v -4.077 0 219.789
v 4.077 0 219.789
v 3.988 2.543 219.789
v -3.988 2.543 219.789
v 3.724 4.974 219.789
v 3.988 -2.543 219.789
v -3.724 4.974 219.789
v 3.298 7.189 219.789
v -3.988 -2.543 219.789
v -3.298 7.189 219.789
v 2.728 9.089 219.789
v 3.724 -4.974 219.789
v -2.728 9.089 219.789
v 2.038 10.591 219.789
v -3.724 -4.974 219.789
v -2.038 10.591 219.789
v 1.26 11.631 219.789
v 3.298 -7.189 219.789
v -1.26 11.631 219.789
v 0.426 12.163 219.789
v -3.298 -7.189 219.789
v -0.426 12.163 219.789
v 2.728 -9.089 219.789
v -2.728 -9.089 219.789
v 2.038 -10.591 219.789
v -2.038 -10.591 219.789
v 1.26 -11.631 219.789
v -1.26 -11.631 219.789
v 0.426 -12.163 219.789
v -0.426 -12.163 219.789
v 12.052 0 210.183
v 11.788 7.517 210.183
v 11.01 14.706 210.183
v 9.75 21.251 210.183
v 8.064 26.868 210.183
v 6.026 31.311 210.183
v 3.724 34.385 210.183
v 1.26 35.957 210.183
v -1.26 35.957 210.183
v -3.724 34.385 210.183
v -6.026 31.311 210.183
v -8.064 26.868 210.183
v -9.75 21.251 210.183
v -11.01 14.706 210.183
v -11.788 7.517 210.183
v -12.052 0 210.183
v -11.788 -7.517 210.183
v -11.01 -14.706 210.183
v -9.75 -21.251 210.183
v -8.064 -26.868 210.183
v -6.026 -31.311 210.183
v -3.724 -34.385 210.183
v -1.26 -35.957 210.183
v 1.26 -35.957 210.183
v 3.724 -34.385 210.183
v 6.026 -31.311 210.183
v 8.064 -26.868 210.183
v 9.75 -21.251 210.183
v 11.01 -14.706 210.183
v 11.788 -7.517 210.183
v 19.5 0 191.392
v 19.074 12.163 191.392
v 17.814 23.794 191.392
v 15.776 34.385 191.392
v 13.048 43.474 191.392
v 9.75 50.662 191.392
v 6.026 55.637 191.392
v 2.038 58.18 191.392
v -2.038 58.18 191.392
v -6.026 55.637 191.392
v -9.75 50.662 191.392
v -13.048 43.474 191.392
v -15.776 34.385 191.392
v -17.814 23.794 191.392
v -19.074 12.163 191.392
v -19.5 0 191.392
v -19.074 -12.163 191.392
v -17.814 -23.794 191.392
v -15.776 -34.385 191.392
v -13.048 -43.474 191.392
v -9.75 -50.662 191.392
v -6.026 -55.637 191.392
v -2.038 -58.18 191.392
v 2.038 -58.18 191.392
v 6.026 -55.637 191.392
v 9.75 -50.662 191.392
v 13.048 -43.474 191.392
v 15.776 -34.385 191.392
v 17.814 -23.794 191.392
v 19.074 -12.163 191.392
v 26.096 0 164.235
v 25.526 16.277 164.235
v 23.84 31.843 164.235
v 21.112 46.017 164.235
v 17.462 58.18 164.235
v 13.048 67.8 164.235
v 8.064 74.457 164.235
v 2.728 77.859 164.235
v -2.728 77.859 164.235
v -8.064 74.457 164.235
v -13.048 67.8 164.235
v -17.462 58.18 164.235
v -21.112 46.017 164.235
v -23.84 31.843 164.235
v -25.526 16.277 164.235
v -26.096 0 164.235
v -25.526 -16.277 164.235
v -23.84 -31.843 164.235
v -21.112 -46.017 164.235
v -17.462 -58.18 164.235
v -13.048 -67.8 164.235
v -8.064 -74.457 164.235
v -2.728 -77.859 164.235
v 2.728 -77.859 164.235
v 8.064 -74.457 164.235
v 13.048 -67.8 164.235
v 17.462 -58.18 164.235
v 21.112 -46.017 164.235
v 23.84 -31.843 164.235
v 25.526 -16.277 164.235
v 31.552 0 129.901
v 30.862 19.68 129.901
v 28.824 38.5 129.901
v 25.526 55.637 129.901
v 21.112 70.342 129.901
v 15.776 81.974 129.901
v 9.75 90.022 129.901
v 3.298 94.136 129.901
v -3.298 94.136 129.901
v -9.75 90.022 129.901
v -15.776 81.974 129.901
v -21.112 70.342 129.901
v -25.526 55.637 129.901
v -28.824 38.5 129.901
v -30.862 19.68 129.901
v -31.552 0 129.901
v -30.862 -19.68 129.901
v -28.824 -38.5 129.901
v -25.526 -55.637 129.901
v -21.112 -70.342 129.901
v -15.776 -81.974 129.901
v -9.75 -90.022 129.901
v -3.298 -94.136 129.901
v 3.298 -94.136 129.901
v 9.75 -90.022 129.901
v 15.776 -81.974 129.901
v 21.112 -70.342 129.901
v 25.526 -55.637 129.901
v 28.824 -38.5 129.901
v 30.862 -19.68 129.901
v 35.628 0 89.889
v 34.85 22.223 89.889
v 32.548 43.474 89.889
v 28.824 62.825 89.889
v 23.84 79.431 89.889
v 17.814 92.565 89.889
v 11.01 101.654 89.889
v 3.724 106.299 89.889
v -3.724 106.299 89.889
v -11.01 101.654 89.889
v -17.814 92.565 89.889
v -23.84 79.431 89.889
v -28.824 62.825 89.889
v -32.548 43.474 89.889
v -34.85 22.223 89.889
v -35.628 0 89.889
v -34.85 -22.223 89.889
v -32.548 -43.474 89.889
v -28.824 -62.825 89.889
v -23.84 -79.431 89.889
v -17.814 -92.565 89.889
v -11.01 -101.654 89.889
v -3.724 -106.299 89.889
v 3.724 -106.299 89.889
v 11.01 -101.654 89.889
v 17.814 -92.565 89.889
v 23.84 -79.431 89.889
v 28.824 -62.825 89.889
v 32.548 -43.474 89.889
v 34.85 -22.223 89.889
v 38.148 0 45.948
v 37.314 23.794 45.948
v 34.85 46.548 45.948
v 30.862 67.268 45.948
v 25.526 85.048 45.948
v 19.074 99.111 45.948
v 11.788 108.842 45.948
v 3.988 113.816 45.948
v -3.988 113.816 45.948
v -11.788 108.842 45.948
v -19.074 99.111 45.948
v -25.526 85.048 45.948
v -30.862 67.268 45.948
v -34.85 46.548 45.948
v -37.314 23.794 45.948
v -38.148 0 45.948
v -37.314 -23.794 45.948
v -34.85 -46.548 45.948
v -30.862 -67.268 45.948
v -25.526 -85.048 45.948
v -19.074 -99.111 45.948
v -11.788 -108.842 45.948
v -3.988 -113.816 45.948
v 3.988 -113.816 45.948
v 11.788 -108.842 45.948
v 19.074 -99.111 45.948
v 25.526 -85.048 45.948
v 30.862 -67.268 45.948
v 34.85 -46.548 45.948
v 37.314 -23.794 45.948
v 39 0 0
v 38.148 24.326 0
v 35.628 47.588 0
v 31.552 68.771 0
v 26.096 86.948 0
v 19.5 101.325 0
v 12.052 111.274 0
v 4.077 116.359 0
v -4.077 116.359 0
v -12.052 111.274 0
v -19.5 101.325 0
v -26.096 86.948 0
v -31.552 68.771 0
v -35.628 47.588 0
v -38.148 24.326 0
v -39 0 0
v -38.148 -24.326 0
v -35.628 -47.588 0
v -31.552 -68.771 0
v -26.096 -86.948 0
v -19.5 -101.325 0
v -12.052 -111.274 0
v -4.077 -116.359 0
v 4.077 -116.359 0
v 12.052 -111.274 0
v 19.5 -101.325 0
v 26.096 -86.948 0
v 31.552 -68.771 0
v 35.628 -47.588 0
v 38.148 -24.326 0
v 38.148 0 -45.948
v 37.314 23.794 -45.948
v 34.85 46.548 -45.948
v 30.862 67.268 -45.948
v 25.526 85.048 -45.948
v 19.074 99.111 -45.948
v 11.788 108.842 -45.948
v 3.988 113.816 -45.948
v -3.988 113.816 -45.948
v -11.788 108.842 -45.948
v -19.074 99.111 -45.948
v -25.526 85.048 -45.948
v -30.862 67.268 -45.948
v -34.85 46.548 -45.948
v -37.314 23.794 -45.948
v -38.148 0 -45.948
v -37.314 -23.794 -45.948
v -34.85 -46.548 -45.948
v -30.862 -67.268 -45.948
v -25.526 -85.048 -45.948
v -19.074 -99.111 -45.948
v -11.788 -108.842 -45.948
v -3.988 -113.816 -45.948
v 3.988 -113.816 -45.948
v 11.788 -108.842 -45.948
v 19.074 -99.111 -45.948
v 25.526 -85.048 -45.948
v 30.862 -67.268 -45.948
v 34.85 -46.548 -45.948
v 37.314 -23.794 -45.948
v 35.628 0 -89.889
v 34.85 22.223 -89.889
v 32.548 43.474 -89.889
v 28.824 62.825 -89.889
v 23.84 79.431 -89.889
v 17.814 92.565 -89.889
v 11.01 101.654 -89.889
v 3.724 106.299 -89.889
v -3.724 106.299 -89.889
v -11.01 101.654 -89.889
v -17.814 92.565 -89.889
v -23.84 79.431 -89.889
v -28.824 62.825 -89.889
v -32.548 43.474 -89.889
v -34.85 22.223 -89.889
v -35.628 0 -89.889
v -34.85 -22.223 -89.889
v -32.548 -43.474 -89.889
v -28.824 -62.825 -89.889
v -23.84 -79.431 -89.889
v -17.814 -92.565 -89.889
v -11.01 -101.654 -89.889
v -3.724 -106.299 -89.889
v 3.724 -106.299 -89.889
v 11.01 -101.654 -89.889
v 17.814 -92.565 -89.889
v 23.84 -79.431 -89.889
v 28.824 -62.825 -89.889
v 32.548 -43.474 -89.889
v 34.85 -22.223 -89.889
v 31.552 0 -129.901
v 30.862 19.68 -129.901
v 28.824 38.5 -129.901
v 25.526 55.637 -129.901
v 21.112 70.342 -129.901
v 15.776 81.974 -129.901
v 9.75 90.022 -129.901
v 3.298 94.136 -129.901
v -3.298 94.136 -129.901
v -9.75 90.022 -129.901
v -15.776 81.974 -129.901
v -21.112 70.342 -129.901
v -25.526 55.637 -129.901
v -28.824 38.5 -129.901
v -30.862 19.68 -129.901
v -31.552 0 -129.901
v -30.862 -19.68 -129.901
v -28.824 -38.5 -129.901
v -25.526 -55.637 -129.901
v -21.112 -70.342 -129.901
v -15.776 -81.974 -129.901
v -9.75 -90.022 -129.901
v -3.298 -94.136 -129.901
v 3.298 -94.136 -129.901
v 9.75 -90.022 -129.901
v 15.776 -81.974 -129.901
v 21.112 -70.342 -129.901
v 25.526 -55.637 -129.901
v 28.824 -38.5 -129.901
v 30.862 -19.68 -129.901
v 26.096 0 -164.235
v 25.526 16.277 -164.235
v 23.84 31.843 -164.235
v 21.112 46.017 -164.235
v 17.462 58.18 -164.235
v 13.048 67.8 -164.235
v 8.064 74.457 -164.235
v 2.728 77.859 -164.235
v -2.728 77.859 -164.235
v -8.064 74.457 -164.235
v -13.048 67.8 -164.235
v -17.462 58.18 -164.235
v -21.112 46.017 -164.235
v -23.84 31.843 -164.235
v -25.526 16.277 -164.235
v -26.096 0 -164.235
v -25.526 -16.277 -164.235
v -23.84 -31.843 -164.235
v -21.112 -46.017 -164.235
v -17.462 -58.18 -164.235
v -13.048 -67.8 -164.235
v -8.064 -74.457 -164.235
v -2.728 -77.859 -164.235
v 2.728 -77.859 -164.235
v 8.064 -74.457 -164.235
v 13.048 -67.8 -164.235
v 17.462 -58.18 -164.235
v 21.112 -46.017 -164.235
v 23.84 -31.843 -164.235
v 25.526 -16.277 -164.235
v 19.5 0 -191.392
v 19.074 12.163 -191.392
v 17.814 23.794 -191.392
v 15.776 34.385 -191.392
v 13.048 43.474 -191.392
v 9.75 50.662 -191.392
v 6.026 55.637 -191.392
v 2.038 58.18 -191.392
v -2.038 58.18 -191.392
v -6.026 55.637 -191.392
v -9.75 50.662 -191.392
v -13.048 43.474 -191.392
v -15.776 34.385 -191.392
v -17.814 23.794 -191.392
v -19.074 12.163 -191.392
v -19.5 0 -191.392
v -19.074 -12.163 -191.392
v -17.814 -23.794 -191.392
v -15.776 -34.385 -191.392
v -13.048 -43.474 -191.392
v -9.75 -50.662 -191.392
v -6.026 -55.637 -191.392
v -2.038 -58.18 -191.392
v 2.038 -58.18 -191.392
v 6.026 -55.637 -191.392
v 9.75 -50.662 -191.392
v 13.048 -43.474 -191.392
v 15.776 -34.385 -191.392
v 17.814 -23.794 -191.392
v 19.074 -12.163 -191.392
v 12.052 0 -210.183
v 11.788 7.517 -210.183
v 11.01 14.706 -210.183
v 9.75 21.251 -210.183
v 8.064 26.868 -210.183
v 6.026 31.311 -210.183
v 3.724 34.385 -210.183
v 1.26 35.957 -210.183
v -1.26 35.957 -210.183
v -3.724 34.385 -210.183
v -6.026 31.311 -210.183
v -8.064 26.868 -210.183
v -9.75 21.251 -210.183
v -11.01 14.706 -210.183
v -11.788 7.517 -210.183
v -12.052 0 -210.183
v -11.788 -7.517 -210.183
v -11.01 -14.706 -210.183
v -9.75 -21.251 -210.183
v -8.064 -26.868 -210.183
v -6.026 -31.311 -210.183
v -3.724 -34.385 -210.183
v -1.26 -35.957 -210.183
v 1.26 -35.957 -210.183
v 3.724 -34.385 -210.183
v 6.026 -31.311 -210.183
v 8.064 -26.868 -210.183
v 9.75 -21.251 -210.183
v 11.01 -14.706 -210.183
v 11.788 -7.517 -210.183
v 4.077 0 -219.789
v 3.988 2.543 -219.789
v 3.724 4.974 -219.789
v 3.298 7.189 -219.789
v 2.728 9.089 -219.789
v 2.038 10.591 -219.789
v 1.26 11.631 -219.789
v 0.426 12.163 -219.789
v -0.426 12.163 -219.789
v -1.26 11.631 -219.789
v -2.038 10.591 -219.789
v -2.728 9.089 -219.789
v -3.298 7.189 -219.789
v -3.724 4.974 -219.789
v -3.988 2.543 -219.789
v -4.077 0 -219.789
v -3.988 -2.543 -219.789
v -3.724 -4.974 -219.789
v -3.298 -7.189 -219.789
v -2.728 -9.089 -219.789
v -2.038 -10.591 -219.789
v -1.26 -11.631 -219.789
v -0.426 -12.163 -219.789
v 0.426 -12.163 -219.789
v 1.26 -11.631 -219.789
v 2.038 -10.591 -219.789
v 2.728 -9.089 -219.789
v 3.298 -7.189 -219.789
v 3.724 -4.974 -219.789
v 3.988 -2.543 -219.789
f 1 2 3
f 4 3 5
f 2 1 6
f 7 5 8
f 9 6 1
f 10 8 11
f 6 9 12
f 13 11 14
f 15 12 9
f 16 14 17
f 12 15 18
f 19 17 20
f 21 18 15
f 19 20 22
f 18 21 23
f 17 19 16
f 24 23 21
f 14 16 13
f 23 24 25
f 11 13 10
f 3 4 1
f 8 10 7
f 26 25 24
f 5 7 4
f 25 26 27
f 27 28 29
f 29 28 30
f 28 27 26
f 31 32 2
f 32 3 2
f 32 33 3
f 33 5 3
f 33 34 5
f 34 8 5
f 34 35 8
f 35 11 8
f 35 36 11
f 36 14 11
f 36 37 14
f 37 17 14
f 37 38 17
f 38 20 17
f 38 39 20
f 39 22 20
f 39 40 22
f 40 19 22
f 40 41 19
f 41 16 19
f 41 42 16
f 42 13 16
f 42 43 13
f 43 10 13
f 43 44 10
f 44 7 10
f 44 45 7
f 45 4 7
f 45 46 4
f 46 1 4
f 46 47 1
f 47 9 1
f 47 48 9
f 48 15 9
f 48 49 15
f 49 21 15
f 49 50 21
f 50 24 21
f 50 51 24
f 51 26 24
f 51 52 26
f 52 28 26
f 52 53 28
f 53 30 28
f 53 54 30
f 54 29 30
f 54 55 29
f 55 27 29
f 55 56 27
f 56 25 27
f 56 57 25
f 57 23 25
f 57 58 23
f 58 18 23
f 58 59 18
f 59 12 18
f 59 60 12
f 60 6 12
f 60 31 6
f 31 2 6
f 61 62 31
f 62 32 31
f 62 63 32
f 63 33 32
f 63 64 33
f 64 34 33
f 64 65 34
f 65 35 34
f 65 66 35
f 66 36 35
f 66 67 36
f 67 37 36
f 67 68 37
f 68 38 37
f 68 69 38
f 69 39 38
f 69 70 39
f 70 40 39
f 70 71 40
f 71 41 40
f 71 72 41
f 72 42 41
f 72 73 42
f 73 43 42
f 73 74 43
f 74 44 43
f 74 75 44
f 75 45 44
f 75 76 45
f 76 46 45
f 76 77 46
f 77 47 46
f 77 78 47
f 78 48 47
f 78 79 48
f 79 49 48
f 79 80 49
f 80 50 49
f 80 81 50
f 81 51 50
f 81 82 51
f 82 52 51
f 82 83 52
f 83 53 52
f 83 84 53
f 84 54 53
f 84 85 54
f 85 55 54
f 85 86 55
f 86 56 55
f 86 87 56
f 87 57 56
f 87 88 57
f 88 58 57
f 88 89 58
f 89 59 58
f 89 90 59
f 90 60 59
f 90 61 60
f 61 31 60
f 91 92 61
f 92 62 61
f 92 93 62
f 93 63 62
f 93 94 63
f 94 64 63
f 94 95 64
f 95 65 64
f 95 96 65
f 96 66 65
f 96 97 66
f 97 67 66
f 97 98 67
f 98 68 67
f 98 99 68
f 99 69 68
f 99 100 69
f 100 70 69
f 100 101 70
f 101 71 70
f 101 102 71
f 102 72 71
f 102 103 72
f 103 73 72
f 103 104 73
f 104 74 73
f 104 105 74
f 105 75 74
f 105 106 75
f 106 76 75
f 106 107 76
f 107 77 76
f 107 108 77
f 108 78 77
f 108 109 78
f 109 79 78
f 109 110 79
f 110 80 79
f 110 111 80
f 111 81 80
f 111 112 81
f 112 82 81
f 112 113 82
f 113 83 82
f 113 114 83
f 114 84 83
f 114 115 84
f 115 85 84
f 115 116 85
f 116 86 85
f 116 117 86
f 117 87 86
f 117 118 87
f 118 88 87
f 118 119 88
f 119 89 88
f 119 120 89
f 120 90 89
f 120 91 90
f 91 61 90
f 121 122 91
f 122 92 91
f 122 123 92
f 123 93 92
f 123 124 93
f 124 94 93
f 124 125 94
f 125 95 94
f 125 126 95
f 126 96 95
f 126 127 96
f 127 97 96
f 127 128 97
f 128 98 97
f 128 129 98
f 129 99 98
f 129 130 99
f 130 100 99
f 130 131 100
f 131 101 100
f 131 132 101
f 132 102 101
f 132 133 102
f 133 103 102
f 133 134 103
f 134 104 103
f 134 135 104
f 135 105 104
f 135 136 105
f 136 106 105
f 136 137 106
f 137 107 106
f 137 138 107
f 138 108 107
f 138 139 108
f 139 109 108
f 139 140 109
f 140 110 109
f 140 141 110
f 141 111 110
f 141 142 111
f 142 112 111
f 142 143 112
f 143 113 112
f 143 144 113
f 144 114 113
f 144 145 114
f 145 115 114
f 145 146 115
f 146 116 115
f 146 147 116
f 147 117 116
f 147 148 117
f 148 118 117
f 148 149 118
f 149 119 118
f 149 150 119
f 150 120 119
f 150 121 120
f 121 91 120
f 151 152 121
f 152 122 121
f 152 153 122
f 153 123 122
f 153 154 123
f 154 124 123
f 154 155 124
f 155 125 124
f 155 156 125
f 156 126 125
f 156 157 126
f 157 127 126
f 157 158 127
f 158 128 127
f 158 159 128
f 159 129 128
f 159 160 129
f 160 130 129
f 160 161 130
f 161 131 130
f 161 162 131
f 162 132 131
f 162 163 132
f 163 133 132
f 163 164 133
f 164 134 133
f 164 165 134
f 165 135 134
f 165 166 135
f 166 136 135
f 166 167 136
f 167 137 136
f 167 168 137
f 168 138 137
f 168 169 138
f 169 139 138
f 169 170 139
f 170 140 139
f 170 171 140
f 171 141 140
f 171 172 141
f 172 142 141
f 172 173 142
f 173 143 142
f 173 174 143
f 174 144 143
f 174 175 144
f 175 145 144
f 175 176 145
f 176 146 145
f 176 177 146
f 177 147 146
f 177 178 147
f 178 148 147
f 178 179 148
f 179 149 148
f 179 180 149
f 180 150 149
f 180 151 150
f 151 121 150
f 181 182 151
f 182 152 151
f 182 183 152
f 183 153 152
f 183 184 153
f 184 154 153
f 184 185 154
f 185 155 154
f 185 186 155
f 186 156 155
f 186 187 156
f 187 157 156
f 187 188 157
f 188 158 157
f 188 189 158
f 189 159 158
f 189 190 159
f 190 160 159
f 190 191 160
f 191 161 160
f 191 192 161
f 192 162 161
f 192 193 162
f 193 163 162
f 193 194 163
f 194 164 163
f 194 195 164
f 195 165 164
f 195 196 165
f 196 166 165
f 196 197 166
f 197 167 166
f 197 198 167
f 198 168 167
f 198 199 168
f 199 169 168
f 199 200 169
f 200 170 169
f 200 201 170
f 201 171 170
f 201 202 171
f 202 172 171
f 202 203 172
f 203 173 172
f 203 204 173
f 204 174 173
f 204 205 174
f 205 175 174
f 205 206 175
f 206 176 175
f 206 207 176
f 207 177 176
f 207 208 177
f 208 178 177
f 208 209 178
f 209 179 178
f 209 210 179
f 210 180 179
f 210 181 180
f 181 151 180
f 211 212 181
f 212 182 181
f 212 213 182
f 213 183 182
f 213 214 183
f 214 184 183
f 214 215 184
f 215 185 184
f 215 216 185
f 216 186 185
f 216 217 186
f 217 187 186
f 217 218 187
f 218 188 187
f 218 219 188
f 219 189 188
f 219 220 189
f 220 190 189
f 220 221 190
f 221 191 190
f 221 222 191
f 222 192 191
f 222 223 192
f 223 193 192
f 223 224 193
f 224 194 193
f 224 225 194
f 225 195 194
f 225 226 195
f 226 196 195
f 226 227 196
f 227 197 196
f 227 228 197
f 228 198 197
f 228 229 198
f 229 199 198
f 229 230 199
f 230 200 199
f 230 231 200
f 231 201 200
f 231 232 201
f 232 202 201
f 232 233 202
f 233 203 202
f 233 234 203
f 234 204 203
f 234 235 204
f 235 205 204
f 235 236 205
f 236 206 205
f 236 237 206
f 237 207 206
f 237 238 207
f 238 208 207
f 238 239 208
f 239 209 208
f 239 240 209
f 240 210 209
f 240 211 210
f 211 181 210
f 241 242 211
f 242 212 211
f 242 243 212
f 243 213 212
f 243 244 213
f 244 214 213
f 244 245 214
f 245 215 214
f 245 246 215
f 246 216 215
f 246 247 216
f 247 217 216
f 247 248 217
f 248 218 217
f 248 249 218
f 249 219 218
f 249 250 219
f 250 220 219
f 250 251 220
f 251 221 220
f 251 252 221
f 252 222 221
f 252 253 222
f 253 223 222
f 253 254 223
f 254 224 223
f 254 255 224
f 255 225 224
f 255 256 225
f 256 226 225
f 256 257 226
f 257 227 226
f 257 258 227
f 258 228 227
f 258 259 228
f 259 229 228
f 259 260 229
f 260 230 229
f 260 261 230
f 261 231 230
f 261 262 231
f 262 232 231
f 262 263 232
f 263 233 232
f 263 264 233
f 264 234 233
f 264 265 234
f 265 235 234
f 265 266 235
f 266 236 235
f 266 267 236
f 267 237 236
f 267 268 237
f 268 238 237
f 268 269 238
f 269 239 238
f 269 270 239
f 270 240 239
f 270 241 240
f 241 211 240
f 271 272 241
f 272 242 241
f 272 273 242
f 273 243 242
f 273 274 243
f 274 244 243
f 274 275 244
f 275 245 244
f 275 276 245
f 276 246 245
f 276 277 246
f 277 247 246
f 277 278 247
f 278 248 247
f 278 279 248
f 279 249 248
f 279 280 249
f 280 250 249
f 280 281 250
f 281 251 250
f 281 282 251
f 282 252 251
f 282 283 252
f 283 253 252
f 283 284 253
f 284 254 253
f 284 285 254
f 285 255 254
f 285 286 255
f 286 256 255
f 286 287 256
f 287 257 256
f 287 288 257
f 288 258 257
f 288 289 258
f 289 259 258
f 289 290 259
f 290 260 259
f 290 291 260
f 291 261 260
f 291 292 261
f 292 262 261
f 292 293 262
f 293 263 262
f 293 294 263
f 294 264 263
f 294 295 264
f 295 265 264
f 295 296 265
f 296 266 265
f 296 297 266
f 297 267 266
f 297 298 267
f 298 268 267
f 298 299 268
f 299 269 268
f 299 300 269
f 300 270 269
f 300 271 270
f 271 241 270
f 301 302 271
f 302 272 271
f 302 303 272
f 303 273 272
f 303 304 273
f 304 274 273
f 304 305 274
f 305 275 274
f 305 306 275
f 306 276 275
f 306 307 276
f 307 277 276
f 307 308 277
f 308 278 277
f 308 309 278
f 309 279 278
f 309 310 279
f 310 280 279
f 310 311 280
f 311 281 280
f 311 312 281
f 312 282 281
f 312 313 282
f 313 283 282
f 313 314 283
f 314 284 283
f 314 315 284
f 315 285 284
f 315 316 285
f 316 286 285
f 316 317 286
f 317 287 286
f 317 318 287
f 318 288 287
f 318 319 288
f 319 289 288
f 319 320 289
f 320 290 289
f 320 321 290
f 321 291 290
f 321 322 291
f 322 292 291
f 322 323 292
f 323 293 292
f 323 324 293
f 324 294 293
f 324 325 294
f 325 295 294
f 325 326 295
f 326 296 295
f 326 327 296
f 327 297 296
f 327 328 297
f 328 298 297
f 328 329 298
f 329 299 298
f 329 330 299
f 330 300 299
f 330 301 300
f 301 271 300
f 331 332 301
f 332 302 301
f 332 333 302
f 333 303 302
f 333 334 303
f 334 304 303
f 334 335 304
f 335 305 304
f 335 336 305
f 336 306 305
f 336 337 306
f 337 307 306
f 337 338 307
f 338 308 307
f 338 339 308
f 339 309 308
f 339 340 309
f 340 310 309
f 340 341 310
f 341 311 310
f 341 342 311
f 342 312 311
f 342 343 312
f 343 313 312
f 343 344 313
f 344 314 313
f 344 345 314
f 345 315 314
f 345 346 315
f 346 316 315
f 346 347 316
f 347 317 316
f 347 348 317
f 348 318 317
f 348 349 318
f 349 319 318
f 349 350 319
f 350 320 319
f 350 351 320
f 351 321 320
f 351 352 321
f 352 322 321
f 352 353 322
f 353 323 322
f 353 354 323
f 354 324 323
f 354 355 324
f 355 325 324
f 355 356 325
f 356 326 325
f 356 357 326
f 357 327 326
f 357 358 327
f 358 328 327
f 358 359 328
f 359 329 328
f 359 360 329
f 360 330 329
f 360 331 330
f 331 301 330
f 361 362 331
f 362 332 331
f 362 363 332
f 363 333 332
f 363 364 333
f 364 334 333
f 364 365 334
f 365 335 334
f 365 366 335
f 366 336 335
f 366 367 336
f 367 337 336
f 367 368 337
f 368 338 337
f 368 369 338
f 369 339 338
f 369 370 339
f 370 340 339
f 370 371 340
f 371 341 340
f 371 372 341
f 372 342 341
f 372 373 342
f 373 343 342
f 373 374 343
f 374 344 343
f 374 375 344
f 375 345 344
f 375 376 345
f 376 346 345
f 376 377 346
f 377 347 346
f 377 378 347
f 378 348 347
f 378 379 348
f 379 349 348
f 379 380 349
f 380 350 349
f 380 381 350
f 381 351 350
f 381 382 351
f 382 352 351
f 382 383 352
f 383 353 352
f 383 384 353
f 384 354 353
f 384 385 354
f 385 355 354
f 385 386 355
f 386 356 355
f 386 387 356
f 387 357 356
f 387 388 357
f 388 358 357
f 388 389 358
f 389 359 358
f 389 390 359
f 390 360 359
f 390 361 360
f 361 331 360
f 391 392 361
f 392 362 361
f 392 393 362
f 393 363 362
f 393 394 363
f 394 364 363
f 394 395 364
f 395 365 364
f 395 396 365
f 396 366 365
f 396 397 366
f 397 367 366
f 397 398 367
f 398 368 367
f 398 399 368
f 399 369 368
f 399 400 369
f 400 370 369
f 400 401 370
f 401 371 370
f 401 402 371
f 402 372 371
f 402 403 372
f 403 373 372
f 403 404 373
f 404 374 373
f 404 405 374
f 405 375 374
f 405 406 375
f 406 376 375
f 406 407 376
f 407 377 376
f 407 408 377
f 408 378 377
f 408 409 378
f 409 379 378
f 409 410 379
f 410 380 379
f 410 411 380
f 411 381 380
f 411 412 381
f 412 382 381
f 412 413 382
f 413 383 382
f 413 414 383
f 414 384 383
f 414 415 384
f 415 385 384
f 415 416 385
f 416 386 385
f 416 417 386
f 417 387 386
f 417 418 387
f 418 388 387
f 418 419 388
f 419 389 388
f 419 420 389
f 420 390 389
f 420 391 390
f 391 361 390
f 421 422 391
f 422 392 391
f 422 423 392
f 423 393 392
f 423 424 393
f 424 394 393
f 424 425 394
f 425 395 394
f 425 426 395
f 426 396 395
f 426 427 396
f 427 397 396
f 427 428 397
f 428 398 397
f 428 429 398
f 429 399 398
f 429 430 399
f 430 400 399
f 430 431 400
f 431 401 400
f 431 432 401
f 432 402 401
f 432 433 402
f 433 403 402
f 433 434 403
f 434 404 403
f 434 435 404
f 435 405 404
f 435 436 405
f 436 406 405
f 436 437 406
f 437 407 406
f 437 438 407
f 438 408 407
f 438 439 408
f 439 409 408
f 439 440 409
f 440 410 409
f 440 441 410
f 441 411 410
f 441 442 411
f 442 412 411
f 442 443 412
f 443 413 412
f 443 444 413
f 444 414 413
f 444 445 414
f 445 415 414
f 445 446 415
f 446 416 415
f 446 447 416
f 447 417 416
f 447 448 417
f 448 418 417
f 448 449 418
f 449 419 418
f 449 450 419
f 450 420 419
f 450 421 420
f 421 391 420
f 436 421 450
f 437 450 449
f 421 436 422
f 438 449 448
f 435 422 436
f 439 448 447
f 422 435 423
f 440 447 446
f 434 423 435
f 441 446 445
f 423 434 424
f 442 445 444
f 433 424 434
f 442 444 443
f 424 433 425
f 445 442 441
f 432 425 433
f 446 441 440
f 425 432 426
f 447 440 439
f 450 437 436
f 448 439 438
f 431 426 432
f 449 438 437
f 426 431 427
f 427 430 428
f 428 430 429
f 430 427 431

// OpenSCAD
// Generated by SolidPython 1.0.1 on 2020-07-29 00:46:45


scale(v = [3, 9, 17]) {
	sphere(r = 13);
}
/***********************************************
*********      SolidPython code:      **********
************************************************
 
# import packages: SolidPython
from solid import *
from solid.utils import *
from itertools import chain, combinations, permutations


class Resize:

    def __init__(self, scad_file):
        self.scad_file = scad_file
        #self.scad_file = import_scad(scad_file)
        # cone/cylinder param:
        self.r1 = 0
        self.r2 = 0
        self.h = 0
        # rectangular prism param:
        self.w = 0
        self.l = 0
        # ellipse param:
        self.r = 0

    # import OpenScad code (file name corresponds to shape)


    # classify shape + parameters
    def assign(self, param1, param2, param3):
        if self.scad_file == 'cone.scad':
            self.r1 = param1
            self.r2 = param2
            self.h = param3
        elif self.scad_file == 'cylinder.scad':
            self.r1 = param1
            self.r2 = param2
            self.h = param3
        elif self.scad_file == 'rectangularPrism.scad':
            self.h = param1
            self.l = param2
            self.w = param3
        else:
            self.r = param1
            self.h = param2

    # resize parameters
    def iterate(self):
        x = range(3, 20, 2)
        i = 1
        if self.scad_file == 'cone.scad':
            tempList = list(permutations(x, 2))
            for temp in tempList:
                param1 = temp[0]
                param2 = temp[1]
                filepath = 'produced_scad_files/' + 'cone' + str(param1) + '_' + str(param2) + '_' + '.scad'
                scad_render_to_file(cylinder(h=param1, r1=param2, r2=0), filepath)

        elif self.scad_file == 'cylinder.scad':
            tempList = list(permutations(x, 3))
            for temp in tempList:
                param1 = temp[0]
                param2 = temp[1]
                filepath = 'produced_scad_files/' + 'cylinder' + str(param1) + '_' + str(param2) + '_' + '.scad'
                scad_render_to_file(cylinder(h=param1, r1=param2, r2=param2), filepath)

        elif self.scad_file == 'rectangularPrism.scad':
            tempList = list(permutations(x, 3))
            for temp in tempList:
                param1 = temp[0]
                param2 = temp[1]
                param3 = temp[2]
                filepath = 'produced_scad_files/' + 'rectangularPrism' + str(param1) + '_' + str(param2) + '_' + str(
                    param3) + '.scad'
                scad_render_to_file(cube(size=(param1, param2, param3)), filepath)

        elif self.scad_file == 'ellipse.scad':
            tempList = list(permutations(x, 4))
            for temp in tempList:
                param1 = temp[0]
                param2 = temp[1]
                param3 = temp[2]
                param4 = temp[3]
                filepath = 'produced_scad_files/' + 'ellipse' + str(param1) + '_' + str(param2) + '_' + str(param3) + '_' + str(param4) + '.scad'
                scad_render_to_file(scale([param1, param2, param3])(sphere(r=param4)), filepath)

    def render_to_scadfile(self):
        scad_render_to_file(scad, 'example.scad') 
 
************************************************/
